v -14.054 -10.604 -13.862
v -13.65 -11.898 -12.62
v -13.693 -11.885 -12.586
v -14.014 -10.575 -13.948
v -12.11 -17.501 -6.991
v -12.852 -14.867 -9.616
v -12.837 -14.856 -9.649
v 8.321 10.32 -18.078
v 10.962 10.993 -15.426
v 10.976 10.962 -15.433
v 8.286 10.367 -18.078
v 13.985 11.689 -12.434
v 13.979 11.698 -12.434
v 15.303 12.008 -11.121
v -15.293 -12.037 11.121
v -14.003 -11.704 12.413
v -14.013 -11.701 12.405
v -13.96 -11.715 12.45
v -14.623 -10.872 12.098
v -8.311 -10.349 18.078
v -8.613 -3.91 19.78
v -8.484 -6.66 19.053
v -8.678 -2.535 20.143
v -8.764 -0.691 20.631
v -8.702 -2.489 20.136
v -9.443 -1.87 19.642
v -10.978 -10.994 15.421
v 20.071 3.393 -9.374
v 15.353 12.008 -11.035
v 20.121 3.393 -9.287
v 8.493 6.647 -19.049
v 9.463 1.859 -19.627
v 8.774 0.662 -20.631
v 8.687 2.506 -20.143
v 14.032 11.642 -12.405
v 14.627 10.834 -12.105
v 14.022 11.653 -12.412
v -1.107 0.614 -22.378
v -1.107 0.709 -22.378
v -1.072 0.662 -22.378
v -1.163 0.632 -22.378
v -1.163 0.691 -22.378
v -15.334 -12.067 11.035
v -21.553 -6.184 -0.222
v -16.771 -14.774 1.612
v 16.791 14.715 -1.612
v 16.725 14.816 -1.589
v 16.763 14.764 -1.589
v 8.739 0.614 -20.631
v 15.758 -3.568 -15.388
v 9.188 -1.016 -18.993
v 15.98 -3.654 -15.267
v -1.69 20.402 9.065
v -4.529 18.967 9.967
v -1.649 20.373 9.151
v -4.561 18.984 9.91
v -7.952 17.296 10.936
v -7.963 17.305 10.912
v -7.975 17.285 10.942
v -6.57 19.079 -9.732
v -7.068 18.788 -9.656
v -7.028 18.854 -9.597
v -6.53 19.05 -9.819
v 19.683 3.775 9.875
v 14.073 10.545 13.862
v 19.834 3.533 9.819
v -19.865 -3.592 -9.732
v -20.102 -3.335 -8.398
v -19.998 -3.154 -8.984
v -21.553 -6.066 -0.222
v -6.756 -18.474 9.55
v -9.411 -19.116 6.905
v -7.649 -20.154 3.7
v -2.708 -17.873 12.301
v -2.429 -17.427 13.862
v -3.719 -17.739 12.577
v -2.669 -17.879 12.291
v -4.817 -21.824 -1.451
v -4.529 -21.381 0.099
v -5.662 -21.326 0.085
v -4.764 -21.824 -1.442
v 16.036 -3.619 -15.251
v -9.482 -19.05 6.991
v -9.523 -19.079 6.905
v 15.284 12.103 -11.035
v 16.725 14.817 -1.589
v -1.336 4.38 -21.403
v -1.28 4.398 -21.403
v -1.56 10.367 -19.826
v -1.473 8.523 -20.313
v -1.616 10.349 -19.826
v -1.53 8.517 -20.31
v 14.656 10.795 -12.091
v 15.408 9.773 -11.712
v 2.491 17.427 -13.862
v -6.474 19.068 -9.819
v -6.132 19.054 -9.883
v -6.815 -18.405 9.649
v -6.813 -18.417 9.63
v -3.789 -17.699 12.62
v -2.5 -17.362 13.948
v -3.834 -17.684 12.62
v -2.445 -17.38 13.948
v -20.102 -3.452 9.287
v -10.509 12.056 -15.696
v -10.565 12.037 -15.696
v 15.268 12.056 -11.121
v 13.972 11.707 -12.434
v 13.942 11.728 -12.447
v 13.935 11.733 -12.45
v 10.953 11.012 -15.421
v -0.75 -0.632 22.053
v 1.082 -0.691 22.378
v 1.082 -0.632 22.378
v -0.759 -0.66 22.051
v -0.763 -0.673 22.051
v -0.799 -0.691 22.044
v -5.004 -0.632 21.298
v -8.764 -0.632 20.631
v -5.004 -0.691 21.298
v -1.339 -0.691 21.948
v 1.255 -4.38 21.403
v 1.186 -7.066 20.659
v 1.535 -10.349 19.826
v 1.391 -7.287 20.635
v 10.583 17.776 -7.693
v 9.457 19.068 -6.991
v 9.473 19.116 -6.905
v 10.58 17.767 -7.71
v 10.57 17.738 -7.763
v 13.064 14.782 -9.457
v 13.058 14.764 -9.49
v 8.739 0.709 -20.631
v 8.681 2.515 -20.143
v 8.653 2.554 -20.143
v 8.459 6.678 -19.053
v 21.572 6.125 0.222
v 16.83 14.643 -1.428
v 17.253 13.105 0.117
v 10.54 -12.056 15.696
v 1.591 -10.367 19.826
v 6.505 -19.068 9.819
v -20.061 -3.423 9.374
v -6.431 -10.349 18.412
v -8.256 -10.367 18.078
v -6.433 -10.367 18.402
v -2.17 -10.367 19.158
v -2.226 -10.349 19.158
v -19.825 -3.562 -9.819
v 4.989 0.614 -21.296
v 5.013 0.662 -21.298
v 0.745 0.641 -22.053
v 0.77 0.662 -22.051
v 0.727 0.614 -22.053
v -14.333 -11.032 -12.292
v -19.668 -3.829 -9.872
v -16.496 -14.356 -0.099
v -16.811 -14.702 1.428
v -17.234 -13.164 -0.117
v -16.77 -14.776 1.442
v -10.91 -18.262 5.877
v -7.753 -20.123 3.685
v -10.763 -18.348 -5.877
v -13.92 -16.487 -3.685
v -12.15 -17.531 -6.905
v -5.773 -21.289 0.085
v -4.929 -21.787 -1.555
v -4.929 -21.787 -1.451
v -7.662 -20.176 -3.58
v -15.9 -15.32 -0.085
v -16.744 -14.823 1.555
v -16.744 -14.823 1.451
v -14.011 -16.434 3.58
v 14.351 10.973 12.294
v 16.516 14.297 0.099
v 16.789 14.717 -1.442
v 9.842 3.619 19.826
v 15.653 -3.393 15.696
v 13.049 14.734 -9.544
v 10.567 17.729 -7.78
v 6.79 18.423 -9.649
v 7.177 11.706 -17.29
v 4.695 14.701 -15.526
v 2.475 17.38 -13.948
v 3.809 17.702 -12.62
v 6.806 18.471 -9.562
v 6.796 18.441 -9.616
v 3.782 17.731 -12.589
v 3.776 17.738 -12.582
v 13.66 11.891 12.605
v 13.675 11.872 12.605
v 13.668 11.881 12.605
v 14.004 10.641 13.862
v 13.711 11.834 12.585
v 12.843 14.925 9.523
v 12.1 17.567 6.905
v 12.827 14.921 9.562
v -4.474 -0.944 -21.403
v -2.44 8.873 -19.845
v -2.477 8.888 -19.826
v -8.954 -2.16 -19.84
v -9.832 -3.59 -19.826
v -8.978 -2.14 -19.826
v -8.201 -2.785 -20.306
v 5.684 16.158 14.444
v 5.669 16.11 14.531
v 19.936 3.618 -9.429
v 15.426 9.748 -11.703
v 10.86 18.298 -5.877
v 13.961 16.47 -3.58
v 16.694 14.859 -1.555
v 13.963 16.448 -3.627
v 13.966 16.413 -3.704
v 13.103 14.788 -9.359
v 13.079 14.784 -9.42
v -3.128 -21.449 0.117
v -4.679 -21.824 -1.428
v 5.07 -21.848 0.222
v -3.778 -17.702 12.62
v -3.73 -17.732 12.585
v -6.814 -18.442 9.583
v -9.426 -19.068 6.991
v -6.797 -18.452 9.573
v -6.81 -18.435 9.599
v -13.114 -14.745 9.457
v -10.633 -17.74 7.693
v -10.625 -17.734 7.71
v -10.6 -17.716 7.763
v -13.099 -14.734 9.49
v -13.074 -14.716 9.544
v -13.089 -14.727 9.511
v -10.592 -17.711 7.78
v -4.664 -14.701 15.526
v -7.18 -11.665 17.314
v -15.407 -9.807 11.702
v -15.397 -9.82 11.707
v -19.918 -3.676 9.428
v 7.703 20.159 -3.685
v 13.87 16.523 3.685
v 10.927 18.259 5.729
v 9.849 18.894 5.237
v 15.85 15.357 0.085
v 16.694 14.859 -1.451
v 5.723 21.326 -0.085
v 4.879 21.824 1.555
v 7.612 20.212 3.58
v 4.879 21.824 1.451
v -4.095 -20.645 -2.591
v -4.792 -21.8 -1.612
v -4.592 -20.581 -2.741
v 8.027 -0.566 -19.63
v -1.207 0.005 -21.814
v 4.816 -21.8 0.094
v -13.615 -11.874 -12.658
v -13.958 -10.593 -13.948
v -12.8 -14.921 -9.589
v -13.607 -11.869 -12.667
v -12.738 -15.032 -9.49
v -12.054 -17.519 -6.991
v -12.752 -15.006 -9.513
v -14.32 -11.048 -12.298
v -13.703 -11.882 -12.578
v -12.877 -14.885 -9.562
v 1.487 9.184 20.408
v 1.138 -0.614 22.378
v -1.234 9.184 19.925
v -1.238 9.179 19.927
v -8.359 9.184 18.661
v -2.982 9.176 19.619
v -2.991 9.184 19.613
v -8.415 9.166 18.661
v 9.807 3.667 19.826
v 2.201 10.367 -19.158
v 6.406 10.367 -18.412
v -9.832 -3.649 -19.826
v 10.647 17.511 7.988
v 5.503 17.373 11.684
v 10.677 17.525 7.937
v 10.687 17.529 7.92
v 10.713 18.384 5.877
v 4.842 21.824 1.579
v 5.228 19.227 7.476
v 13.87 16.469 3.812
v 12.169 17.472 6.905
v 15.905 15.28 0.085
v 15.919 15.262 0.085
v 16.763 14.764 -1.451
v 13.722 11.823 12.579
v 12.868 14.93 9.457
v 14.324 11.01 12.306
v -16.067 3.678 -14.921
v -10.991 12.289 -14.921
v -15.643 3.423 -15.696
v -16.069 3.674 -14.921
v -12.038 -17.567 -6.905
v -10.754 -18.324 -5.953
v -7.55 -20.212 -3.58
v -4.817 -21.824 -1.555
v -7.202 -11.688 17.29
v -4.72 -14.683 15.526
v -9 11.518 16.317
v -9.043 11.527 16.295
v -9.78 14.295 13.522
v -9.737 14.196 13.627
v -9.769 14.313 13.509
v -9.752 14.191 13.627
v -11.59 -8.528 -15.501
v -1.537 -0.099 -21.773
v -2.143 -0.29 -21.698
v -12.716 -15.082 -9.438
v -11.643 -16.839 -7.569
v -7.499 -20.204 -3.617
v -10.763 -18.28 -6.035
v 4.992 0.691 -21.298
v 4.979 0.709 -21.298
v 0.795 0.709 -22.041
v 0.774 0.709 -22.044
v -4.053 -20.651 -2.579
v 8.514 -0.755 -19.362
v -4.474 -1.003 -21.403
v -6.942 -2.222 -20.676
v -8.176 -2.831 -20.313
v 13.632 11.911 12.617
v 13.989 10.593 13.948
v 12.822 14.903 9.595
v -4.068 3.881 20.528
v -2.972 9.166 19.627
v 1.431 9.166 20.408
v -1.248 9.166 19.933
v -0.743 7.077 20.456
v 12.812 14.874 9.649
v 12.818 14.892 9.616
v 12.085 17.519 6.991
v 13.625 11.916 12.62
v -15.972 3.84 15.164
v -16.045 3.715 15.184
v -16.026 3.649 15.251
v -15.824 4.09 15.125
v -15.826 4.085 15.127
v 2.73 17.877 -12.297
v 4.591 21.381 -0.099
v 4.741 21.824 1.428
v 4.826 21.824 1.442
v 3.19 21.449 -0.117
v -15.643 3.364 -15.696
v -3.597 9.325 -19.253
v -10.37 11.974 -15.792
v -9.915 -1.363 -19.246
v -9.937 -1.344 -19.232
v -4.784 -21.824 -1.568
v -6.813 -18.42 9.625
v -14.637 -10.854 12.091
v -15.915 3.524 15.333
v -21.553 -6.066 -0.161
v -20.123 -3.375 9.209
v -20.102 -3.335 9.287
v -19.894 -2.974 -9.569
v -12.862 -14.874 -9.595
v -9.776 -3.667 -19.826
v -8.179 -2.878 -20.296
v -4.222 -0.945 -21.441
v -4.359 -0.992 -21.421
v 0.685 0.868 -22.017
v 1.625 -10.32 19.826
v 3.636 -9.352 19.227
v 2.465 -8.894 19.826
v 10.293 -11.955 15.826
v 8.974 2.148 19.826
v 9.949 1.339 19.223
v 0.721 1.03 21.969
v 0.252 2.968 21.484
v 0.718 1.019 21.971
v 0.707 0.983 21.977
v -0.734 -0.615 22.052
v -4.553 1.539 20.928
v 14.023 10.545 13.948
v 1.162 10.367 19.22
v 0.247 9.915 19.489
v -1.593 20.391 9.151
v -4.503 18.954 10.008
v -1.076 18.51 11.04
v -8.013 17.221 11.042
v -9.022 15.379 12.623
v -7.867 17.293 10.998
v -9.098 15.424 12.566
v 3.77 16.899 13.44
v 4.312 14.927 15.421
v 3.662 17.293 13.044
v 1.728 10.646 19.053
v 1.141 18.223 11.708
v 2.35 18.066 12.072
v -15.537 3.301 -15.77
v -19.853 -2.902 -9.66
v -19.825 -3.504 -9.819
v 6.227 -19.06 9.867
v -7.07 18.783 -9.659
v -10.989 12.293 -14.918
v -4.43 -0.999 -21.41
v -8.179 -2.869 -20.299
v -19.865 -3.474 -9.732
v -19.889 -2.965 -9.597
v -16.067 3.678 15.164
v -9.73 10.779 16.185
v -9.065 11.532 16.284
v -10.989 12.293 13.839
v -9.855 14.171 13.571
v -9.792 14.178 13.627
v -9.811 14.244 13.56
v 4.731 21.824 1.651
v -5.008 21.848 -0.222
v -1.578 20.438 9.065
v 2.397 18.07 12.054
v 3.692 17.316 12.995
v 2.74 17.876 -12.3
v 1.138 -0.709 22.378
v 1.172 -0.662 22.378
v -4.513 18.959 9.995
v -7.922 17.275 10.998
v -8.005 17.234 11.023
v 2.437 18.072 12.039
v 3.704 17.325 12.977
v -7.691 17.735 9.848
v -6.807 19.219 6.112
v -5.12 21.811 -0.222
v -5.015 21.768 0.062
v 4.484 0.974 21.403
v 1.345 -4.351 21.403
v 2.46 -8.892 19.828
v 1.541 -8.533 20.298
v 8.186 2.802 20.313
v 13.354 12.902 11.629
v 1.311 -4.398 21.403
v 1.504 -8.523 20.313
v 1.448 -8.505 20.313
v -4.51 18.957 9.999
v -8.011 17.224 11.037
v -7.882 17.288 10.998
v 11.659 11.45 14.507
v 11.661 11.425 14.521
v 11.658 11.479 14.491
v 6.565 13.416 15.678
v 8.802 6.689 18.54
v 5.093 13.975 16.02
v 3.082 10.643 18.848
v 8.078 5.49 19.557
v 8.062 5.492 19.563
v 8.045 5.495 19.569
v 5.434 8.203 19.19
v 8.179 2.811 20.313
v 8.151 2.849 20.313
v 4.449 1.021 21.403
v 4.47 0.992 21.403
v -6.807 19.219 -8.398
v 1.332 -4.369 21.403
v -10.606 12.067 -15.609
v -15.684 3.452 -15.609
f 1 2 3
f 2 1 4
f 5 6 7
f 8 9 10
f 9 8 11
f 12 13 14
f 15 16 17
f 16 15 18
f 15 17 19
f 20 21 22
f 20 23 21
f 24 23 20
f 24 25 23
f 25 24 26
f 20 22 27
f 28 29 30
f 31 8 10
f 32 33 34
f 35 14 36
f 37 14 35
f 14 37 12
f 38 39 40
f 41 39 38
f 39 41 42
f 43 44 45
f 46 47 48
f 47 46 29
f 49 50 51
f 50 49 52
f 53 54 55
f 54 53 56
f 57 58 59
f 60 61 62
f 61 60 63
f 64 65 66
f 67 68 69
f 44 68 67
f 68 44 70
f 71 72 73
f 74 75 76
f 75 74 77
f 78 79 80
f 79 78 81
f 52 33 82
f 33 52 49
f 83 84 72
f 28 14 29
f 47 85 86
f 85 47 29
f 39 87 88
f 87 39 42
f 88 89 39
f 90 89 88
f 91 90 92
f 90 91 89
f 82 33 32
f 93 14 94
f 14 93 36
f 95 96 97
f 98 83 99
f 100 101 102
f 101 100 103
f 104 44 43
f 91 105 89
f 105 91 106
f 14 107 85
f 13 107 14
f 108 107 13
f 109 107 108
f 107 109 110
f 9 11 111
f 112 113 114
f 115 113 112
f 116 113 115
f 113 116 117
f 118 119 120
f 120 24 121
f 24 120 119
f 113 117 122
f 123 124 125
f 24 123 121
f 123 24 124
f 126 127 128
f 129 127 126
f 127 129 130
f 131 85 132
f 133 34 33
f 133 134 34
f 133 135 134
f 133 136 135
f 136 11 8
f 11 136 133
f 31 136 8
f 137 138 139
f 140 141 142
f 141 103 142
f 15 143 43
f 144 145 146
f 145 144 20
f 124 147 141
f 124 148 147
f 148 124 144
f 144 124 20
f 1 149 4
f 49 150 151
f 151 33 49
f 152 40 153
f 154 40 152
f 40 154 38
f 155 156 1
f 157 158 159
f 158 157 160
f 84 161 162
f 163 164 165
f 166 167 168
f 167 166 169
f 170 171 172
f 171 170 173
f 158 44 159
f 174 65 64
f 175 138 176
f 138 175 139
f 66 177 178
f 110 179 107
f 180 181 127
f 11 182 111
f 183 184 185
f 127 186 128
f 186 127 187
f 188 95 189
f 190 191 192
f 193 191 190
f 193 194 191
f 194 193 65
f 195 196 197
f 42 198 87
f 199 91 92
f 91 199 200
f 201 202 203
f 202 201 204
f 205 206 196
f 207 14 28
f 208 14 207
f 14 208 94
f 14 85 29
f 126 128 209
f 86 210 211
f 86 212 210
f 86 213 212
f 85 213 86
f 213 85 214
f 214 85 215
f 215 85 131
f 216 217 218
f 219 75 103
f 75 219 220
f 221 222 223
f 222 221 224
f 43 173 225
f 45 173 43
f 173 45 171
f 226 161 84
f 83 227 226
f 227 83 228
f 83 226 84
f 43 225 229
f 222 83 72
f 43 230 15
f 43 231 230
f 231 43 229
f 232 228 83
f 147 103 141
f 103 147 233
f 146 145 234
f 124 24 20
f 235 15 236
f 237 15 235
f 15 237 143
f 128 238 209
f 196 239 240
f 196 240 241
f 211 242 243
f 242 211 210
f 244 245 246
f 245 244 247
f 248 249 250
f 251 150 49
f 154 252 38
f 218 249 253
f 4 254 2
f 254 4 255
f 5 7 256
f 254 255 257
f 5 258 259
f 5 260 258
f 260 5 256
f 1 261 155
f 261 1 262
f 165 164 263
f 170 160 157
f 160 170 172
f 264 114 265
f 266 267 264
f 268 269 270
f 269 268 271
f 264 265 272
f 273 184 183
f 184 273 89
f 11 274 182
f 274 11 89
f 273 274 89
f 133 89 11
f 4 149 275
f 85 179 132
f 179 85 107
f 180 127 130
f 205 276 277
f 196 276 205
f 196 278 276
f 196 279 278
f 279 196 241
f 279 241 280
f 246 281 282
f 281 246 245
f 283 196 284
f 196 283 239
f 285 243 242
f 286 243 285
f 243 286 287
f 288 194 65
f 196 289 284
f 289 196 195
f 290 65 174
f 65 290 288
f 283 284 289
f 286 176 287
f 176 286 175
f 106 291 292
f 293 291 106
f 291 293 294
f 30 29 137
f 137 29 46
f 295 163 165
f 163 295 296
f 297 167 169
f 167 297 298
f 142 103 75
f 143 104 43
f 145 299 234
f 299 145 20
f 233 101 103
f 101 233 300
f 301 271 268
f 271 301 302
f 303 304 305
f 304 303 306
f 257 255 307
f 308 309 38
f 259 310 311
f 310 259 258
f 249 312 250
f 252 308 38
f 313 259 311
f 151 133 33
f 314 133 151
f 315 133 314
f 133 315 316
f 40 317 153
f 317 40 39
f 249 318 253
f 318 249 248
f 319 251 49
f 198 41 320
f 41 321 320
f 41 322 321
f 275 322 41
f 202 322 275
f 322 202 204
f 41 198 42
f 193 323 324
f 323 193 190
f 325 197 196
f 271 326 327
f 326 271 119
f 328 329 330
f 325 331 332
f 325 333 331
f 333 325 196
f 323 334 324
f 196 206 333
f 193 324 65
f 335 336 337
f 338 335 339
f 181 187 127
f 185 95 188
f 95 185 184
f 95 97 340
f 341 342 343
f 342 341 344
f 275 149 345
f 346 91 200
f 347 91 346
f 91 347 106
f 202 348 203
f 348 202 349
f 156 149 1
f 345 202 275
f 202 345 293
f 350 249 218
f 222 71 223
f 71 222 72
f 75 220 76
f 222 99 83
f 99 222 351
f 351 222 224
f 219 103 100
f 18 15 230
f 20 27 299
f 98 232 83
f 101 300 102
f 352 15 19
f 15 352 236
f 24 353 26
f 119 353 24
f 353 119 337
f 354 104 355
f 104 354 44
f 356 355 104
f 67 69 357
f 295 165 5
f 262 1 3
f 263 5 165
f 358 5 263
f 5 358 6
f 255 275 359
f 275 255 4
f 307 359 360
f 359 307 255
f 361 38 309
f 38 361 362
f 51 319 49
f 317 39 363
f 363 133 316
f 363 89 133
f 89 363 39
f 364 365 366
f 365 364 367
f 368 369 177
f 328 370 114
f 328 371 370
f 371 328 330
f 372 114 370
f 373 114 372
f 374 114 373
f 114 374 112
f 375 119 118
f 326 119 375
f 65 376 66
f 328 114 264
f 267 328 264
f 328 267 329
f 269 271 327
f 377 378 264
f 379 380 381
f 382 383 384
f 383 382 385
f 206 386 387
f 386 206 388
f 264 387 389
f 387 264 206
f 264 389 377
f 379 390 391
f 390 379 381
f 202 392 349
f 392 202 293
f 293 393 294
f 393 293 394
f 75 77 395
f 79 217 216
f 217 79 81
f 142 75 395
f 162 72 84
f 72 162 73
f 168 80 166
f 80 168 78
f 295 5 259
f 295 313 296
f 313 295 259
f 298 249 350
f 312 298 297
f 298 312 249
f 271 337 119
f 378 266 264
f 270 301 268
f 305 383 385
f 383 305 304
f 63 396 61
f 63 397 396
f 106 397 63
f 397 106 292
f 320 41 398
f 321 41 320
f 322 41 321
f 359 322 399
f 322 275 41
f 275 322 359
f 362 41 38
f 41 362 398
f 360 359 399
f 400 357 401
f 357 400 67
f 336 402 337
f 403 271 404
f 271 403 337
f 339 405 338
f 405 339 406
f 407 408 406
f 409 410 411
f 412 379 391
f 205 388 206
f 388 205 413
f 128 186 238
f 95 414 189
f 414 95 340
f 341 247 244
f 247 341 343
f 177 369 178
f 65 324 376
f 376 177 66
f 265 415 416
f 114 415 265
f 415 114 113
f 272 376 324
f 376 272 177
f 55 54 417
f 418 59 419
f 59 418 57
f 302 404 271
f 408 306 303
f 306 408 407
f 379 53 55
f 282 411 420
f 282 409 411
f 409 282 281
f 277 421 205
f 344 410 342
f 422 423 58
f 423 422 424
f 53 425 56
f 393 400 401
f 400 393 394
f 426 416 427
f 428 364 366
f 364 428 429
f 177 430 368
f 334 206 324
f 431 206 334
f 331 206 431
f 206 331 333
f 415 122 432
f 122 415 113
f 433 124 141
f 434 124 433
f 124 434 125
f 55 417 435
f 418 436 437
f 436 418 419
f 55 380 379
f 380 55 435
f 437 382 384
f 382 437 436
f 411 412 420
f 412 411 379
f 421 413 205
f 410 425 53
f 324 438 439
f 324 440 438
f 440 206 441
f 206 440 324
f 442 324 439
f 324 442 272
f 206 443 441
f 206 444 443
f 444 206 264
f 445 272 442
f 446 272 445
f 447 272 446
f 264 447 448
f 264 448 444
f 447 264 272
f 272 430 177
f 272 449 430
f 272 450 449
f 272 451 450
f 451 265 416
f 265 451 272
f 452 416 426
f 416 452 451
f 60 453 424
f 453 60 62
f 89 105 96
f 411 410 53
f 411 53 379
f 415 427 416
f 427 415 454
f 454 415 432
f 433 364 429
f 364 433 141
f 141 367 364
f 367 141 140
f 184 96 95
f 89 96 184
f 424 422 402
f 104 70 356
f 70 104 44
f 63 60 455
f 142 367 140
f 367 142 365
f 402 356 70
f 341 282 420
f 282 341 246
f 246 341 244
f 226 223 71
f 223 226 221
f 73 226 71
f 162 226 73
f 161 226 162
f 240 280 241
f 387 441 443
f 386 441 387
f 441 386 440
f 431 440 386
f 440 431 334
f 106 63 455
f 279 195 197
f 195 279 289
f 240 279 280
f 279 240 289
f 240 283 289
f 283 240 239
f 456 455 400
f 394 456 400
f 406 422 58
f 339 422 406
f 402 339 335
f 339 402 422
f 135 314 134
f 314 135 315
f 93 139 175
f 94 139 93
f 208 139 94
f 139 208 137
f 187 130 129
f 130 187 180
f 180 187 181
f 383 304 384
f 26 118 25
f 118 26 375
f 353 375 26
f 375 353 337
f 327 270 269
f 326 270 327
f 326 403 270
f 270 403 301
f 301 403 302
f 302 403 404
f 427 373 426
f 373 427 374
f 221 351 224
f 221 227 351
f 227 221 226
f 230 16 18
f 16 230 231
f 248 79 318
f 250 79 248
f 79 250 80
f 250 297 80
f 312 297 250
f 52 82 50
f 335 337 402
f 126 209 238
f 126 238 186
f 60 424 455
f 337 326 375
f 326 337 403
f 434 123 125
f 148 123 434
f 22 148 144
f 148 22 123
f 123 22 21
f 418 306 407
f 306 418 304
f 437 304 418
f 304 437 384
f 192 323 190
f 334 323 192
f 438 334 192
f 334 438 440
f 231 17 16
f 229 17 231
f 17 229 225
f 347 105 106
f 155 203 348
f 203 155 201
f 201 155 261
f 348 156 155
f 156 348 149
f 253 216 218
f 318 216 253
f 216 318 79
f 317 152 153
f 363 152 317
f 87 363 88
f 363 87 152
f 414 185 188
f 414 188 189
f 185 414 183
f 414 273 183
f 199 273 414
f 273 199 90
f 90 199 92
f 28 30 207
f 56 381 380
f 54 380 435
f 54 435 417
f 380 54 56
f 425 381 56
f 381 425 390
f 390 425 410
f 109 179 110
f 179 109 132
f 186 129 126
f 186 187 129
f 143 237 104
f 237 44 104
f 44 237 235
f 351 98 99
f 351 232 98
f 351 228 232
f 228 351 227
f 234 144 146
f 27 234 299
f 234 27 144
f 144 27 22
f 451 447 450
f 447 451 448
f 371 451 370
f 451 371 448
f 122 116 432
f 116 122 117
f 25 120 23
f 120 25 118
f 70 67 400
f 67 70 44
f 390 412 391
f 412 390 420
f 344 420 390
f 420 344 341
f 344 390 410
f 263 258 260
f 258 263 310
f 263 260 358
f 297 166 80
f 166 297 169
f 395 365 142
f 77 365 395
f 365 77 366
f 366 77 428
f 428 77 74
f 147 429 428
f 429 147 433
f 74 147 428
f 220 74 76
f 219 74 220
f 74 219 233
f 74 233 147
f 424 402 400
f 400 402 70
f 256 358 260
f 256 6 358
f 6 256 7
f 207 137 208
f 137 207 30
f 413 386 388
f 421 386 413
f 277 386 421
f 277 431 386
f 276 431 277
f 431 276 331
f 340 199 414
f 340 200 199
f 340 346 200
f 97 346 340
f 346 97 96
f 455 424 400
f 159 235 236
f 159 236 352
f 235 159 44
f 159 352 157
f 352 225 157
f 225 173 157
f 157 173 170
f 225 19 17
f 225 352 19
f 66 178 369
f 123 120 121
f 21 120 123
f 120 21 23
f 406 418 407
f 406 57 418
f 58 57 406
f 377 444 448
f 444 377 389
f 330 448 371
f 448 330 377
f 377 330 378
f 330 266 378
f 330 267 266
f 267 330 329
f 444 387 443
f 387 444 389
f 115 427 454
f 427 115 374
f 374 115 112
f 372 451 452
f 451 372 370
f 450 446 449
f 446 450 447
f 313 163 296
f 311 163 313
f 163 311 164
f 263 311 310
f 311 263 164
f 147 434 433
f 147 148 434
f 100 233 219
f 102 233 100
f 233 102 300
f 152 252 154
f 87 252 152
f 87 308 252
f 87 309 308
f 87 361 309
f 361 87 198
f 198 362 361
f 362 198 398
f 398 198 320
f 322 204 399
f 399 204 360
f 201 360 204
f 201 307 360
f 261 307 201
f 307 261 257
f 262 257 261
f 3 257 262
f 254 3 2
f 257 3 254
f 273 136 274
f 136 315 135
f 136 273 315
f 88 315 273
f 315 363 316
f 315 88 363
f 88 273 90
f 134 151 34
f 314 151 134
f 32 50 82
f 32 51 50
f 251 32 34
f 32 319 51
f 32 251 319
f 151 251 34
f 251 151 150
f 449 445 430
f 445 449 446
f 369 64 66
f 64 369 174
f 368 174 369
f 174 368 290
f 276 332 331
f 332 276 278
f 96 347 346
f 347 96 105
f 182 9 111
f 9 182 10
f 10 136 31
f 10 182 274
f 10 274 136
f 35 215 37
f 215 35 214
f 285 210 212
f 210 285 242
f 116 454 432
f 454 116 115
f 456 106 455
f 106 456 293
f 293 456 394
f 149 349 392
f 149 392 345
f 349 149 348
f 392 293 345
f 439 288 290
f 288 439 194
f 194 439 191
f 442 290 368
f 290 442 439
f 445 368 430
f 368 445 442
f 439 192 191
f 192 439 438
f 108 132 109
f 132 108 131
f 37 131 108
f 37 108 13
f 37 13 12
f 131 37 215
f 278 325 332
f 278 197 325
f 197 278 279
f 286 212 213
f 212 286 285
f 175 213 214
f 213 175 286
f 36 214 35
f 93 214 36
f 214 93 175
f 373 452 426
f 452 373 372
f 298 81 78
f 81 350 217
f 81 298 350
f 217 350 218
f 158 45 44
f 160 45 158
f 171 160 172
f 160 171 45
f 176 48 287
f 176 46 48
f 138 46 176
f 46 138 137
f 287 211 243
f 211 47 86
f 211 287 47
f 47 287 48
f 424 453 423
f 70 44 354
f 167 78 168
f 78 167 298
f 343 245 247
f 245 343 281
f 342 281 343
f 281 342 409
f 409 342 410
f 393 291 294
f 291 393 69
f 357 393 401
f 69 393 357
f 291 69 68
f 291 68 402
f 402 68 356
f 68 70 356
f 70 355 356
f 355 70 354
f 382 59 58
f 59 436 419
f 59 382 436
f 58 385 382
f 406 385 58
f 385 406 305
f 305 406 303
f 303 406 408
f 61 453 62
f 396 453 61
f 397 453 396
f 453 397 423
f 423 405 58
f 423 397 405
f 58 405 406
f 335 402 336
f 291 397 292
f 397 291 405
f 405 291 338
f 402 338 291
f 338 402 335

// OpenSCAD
// Auto-generated OpenSCAD file

    inner_points = 10*[[-2.147181721933595, -0.6125228911105931, -0.022233721226839975], [1.4975738002339152, 1.2171443618142557, 1.123343354837028], [-1.6663340255978591, -1.4763745869015392, -0.1723861125089058], [1.9784214965696507, 0.35329266602330955, 0.9731909635549623], [-1.9784214965696507, -0.35329266602330955, -0.9731909635549623], [1.6663340255978591, 1.4763745869015392, 0.1723861125089058], [-1.4975738002339152, -1.2171443618142557, -1.123343354837028], [2.147181721933595, 0.6125228911105931, 0.022233721226839975], [-1.0280687737374308, -0.3330955036984619, 1.954018925031606], [-0.1676587091381568, 0.0988303441971033, 2.224452988448126], [-0.547221077401695, -1.1969471994894083, 1.80386653374954], [0.313188987197579, -0.765021351593843, 2.07430059716606], [-0.313188987197579, 0.765021351593843, -2.07430059716606], [0.547221077401695, 1.1969471994894083, -1.80386653374954], [0.1676587091381568, -0.0988303441971033, -2.224452988448126], [1.0280687737374308, 0.3330955036984619, -1.954018925031606], [-0.6726268446335121, 1.9160150643285994, 0.9287235210998099], [0.503866619269568, -2.1752452894158827, 0.022233721228312353], [2.0237176723082113, -0.6125228911102443, 0.7179487921524583], [-0.503866619269568, 2.1752452894158827, -0.022233721228312353], [0.6726268446335121, -1.9160150643285994, -0.9287235210998099], [2.1924778976721555, -0.3532926660229606, -0.23300845017566402], [0.927058622781811, 1.9121577495628521, 0.685771848512618], [-0.927058622781811, -1.9121577495628521, -0.685771848512618], [1.3708203463401416, -1.7471767562861986, -0.23300845017492777], [-1.4315815123496172, -1.0343501578436425, 1.3662950274254113], [0.8210012810337749, 0.09644639256656445, 2.0743005971656054], [-0.8210012810337749, -0.09644639256656445, -2.0743005971656054], [1.4315815123496172, 1.0343501578436425, -1.3662950274254113], [-1.0907716573533395, 1.2233856282105418, 1.516447418706741], [0.6489516514014413, -1.9020591684003363, 0.9731909635561535], [-0.6489516514014413, 1.9020591684003363, -0.9731909635561535], [1.0907716573533395, -1.2233856282105418, -1.516447418706741], [-2.0020966898017214, -0.33933677009504604, 0.9287235211010012], [0.7822487677665146, 1.0584046349342373, 1.8038665337483493], [-1.2240687737184126, -1.7370781751240318, 0.6857718485145453], [1.5602766838498234, -0.3393367700947481, 1.5609148611618933], [-1.5602766838498234, 0.3393367700947481, -1.5609148611618933], [1.2240687737184126, 1.7370781751240318, -0.6857718485145453], [-0.7822487677665146, -1.0584046349342373, -1.8038665337483493], [2.0020966898017214, 0.33933677009504604, -0.9287235211010012], [-1.5985839511895352, 0.36191788405013425, 1.516447418707196], [-0.20641122240541715, 1.0607885865647761, 1.9540189250308702], [-0.33970833877049067, -1.8996752167697974, 1.1233433548386742], [1.0524643900136275, -1.2008045142551556, 1.5609148611623485], [-1.0524643900136275, 1.2008045142551556, -1.5609148611623485], [0.33970833877049067, 1.8996752167697974, -1.1233433548386742], [0.20641122240541715, -1.0607885865647761, -1.9540189250308702], [1.5985839511895352, -0.36191788405013425, -1.516447418707196], [0.21173359031441008, 1.7534180226828338, 1.366295027423939], [-0.48479337090236396, -2.1728613377853443, 0.17238611251083324], [1.5159053784720158, -1.473990635270652, 0.7179487921529134], [0.48479337090236396, 2.1728613377853443, -0.17238611251083324], [-0.21173359031441008, -1.7534180226828338, -1.366295027423939], [1.7889651590599696, -1.0545473201681412, -0.8207323477818588]];

    outer_points = 10*[[0.8723958733185133, 0.06615064908058033, -2.0544141523419364], [0.15751608677391848, -1.0319662062139903, 1.973905369854271], [0.8270996975796362, 1.0319662062139903, -1.7991719809389455], [0.11221991103504136, -0.06615064908058033, 2.229147541257262], [-0.11221991103504136, 0.06615064908058033, -2.229147541257262], [-0.8270996975796362, -1.0319662062139903, 1.7991719809389455], [-0.15751608677391848, 1.0319662062139903, -1.973905369854271], [-0.8723958733185133, -0.06615064908058033, 2.0544141523419364], [2.1924778976724366, -0.35329266602279574, -0.23300845017327093], [2.0237176723073724, -0.6125228911106142, 0.7179487921545069], [2.1471817219335594, 0.6125228911106142, 0.022233721229720005], [1.9784214965684954, 0.35329266602279574, 0.9731909635574978], [-1.9784214965684954, -0.35329266602279574, -0.9731909635574978], [-2.1471817219335594, -0.6125228911106142, -0.022233721229720005], [-2.0237176723073724, 0.6125228911106142, -0.7179487921545069], [-2.1924778976724366, 0.35329266602279574, 0.23300845017327093], [0.5038666192695755, -2.1752452894158876, 0.022233721227690392], [0.4807491650839791, 2.1752452894158876, 0.15249966768763507], [0.14717764696877234, 0.9136323277340612, 2.0321620721418276], [-0.4807491650839791, -2.1752452894158876, -0.15249966768763507], [-0.5038666192695755, 2.1752452894158876, -0.022233721227690392], [-0.8374381373847823, 0.9136323277340612, 1.8574286832265023], [-0.24599665183756222, -1.7332208603588481, 1.3861814722472068], [0.24599665183756222, 1.7332208603588481, -1.3861814722472068], [-0.16086561818353615, 2.034330296982295, 0.9064714408993516], [2.0020966898028134, 0.33933677009559726, -0.9287235210984455], [1.5602766838479842, -0.33933677009559726, 1.560914861163547], [-1.5602766838479842, 0.33933677009559726, -1.560914861163547], [-2.0020966898028134, -0.33933677009559726, 0.9287235210984455], [1.3708203463404445, -1.7471767562860465, -0.23300845017428576], [1.2069372429567986, 1.7471767562860465, 0.690466401324062], [-1.2069372429567986, -1.7471767562860465, -0.690466401324062], [-1.3708203463404445, 1.7471767562860465, 0.23300845017428576], [1.598583951191333, -0.3619178840492606, -1.5164474187055097], [1.0524643900118018, -1.2008045142560126, 1.56091486116292], [1.5252931992854413, 1.2008045142560126, -1.103456910013144], [0.9791736381059102, 0.3619178840492606, 1.9739053698552858], [-0.9791736381059102, -0.3619178840492606, -1.9739053698552858], [-1.5252931992854413, -1.2008045142560126, 1.103456910013144], [-1.0524643900118018, 1.2008045142560126, -1.56091486116292], [-1.598583951191333, 0.3619178840492606, 1.5164474187055097], [1.7889651590609557, -1.0545473201676536, -0.820732347780335], [1.5159053784711902, -1.4739906352710297, 0.7179487921538799], [1.6703782314161868, 1.4739906352710297, -0.1524996676849783], [1.3973184508264214, 1.0545473201676536, 1.3861814722492365], [-1.3973184508264214, -1.0545473201676536, -1.3861814722492365], [-1.6703782314161868, -1.4739906352710297, 0.1524996676849783], [-1.5159053784711902, 1.4739906352710297, -0.7179487921538799], [-1.7889651590609557, 1.0545473201676536, 0.820732347780335], [0.6489516514003212, -1.9020591684008705, 0.9731909635558559], [0.9441901535433673, 1.9020591684008705, -0.6904664013214051], [0.5653224596892834, 1.6062617638524541, 1.4444381745357786], [-0.9441901535433673, -1.9020591684008705, 0.6904664013214051], [-0.6489516514003212, 1.9020591684008705, -0.9731909635558559], [-1.027819345254405, 1.6062617638524541, 1.1617136123013276]];

    // Convex hull for inner set (I)
    module inner_hull() {
        hull() {
            for (p = inner_points) {
                translate(p) sphere(r=0.1);
            }
        }
    }

    // Convex hull for outer set (O) minus inner hull (O \ I)
    module outer_minus_inner() {
        difference() {
            hull() {
                for (p = outer_points) {
                    translate(p) sphere(r=0.1);
                }
            }
            inner_hull(); // Subtract inner hull
        }
    }

    // Convex hull for outer set (O) minus all translated inner hulls
    module outer_minus_AllTranslationInner() {
        difference() {
            hull() {
                for (p = outer_points) {
                    translate(p) sphere(r=0.1);
                }
            }
            hull() {
                translate([0,0,50]) inner_hull();
                translate([0,0,-50]) inner_hull();
            }; // Subtract translated inner hulls
        }
    }

    // Difference between outer_minus_inner and outer_minus_AllTranslationInner
    module outer_minus_inner_diff() {
        difference() {
            // Outer minus inner
            difference() {
                hull() {
                    for (p = outer_points) {
                        translate(p) sphere(r=0.1);
                    }
                }
                inner_hull();
            }

            // Subtract Outer minus AllTranslationInner
            difference() {
                hull() {
                    for (p = outer_points) {
                        translate(p) sphere(r=0.1);
                    }
                }
                hull() {
                    translate([0,0,50]) inner_hull();
                    translate([0,0,-50]) inner_hull();
                };
            }
        }
    }

    // Rendering all with colors applied
    color([1, 1, 0, 1]) outer_minus_inner_diff(); // Opaque yellow
    
